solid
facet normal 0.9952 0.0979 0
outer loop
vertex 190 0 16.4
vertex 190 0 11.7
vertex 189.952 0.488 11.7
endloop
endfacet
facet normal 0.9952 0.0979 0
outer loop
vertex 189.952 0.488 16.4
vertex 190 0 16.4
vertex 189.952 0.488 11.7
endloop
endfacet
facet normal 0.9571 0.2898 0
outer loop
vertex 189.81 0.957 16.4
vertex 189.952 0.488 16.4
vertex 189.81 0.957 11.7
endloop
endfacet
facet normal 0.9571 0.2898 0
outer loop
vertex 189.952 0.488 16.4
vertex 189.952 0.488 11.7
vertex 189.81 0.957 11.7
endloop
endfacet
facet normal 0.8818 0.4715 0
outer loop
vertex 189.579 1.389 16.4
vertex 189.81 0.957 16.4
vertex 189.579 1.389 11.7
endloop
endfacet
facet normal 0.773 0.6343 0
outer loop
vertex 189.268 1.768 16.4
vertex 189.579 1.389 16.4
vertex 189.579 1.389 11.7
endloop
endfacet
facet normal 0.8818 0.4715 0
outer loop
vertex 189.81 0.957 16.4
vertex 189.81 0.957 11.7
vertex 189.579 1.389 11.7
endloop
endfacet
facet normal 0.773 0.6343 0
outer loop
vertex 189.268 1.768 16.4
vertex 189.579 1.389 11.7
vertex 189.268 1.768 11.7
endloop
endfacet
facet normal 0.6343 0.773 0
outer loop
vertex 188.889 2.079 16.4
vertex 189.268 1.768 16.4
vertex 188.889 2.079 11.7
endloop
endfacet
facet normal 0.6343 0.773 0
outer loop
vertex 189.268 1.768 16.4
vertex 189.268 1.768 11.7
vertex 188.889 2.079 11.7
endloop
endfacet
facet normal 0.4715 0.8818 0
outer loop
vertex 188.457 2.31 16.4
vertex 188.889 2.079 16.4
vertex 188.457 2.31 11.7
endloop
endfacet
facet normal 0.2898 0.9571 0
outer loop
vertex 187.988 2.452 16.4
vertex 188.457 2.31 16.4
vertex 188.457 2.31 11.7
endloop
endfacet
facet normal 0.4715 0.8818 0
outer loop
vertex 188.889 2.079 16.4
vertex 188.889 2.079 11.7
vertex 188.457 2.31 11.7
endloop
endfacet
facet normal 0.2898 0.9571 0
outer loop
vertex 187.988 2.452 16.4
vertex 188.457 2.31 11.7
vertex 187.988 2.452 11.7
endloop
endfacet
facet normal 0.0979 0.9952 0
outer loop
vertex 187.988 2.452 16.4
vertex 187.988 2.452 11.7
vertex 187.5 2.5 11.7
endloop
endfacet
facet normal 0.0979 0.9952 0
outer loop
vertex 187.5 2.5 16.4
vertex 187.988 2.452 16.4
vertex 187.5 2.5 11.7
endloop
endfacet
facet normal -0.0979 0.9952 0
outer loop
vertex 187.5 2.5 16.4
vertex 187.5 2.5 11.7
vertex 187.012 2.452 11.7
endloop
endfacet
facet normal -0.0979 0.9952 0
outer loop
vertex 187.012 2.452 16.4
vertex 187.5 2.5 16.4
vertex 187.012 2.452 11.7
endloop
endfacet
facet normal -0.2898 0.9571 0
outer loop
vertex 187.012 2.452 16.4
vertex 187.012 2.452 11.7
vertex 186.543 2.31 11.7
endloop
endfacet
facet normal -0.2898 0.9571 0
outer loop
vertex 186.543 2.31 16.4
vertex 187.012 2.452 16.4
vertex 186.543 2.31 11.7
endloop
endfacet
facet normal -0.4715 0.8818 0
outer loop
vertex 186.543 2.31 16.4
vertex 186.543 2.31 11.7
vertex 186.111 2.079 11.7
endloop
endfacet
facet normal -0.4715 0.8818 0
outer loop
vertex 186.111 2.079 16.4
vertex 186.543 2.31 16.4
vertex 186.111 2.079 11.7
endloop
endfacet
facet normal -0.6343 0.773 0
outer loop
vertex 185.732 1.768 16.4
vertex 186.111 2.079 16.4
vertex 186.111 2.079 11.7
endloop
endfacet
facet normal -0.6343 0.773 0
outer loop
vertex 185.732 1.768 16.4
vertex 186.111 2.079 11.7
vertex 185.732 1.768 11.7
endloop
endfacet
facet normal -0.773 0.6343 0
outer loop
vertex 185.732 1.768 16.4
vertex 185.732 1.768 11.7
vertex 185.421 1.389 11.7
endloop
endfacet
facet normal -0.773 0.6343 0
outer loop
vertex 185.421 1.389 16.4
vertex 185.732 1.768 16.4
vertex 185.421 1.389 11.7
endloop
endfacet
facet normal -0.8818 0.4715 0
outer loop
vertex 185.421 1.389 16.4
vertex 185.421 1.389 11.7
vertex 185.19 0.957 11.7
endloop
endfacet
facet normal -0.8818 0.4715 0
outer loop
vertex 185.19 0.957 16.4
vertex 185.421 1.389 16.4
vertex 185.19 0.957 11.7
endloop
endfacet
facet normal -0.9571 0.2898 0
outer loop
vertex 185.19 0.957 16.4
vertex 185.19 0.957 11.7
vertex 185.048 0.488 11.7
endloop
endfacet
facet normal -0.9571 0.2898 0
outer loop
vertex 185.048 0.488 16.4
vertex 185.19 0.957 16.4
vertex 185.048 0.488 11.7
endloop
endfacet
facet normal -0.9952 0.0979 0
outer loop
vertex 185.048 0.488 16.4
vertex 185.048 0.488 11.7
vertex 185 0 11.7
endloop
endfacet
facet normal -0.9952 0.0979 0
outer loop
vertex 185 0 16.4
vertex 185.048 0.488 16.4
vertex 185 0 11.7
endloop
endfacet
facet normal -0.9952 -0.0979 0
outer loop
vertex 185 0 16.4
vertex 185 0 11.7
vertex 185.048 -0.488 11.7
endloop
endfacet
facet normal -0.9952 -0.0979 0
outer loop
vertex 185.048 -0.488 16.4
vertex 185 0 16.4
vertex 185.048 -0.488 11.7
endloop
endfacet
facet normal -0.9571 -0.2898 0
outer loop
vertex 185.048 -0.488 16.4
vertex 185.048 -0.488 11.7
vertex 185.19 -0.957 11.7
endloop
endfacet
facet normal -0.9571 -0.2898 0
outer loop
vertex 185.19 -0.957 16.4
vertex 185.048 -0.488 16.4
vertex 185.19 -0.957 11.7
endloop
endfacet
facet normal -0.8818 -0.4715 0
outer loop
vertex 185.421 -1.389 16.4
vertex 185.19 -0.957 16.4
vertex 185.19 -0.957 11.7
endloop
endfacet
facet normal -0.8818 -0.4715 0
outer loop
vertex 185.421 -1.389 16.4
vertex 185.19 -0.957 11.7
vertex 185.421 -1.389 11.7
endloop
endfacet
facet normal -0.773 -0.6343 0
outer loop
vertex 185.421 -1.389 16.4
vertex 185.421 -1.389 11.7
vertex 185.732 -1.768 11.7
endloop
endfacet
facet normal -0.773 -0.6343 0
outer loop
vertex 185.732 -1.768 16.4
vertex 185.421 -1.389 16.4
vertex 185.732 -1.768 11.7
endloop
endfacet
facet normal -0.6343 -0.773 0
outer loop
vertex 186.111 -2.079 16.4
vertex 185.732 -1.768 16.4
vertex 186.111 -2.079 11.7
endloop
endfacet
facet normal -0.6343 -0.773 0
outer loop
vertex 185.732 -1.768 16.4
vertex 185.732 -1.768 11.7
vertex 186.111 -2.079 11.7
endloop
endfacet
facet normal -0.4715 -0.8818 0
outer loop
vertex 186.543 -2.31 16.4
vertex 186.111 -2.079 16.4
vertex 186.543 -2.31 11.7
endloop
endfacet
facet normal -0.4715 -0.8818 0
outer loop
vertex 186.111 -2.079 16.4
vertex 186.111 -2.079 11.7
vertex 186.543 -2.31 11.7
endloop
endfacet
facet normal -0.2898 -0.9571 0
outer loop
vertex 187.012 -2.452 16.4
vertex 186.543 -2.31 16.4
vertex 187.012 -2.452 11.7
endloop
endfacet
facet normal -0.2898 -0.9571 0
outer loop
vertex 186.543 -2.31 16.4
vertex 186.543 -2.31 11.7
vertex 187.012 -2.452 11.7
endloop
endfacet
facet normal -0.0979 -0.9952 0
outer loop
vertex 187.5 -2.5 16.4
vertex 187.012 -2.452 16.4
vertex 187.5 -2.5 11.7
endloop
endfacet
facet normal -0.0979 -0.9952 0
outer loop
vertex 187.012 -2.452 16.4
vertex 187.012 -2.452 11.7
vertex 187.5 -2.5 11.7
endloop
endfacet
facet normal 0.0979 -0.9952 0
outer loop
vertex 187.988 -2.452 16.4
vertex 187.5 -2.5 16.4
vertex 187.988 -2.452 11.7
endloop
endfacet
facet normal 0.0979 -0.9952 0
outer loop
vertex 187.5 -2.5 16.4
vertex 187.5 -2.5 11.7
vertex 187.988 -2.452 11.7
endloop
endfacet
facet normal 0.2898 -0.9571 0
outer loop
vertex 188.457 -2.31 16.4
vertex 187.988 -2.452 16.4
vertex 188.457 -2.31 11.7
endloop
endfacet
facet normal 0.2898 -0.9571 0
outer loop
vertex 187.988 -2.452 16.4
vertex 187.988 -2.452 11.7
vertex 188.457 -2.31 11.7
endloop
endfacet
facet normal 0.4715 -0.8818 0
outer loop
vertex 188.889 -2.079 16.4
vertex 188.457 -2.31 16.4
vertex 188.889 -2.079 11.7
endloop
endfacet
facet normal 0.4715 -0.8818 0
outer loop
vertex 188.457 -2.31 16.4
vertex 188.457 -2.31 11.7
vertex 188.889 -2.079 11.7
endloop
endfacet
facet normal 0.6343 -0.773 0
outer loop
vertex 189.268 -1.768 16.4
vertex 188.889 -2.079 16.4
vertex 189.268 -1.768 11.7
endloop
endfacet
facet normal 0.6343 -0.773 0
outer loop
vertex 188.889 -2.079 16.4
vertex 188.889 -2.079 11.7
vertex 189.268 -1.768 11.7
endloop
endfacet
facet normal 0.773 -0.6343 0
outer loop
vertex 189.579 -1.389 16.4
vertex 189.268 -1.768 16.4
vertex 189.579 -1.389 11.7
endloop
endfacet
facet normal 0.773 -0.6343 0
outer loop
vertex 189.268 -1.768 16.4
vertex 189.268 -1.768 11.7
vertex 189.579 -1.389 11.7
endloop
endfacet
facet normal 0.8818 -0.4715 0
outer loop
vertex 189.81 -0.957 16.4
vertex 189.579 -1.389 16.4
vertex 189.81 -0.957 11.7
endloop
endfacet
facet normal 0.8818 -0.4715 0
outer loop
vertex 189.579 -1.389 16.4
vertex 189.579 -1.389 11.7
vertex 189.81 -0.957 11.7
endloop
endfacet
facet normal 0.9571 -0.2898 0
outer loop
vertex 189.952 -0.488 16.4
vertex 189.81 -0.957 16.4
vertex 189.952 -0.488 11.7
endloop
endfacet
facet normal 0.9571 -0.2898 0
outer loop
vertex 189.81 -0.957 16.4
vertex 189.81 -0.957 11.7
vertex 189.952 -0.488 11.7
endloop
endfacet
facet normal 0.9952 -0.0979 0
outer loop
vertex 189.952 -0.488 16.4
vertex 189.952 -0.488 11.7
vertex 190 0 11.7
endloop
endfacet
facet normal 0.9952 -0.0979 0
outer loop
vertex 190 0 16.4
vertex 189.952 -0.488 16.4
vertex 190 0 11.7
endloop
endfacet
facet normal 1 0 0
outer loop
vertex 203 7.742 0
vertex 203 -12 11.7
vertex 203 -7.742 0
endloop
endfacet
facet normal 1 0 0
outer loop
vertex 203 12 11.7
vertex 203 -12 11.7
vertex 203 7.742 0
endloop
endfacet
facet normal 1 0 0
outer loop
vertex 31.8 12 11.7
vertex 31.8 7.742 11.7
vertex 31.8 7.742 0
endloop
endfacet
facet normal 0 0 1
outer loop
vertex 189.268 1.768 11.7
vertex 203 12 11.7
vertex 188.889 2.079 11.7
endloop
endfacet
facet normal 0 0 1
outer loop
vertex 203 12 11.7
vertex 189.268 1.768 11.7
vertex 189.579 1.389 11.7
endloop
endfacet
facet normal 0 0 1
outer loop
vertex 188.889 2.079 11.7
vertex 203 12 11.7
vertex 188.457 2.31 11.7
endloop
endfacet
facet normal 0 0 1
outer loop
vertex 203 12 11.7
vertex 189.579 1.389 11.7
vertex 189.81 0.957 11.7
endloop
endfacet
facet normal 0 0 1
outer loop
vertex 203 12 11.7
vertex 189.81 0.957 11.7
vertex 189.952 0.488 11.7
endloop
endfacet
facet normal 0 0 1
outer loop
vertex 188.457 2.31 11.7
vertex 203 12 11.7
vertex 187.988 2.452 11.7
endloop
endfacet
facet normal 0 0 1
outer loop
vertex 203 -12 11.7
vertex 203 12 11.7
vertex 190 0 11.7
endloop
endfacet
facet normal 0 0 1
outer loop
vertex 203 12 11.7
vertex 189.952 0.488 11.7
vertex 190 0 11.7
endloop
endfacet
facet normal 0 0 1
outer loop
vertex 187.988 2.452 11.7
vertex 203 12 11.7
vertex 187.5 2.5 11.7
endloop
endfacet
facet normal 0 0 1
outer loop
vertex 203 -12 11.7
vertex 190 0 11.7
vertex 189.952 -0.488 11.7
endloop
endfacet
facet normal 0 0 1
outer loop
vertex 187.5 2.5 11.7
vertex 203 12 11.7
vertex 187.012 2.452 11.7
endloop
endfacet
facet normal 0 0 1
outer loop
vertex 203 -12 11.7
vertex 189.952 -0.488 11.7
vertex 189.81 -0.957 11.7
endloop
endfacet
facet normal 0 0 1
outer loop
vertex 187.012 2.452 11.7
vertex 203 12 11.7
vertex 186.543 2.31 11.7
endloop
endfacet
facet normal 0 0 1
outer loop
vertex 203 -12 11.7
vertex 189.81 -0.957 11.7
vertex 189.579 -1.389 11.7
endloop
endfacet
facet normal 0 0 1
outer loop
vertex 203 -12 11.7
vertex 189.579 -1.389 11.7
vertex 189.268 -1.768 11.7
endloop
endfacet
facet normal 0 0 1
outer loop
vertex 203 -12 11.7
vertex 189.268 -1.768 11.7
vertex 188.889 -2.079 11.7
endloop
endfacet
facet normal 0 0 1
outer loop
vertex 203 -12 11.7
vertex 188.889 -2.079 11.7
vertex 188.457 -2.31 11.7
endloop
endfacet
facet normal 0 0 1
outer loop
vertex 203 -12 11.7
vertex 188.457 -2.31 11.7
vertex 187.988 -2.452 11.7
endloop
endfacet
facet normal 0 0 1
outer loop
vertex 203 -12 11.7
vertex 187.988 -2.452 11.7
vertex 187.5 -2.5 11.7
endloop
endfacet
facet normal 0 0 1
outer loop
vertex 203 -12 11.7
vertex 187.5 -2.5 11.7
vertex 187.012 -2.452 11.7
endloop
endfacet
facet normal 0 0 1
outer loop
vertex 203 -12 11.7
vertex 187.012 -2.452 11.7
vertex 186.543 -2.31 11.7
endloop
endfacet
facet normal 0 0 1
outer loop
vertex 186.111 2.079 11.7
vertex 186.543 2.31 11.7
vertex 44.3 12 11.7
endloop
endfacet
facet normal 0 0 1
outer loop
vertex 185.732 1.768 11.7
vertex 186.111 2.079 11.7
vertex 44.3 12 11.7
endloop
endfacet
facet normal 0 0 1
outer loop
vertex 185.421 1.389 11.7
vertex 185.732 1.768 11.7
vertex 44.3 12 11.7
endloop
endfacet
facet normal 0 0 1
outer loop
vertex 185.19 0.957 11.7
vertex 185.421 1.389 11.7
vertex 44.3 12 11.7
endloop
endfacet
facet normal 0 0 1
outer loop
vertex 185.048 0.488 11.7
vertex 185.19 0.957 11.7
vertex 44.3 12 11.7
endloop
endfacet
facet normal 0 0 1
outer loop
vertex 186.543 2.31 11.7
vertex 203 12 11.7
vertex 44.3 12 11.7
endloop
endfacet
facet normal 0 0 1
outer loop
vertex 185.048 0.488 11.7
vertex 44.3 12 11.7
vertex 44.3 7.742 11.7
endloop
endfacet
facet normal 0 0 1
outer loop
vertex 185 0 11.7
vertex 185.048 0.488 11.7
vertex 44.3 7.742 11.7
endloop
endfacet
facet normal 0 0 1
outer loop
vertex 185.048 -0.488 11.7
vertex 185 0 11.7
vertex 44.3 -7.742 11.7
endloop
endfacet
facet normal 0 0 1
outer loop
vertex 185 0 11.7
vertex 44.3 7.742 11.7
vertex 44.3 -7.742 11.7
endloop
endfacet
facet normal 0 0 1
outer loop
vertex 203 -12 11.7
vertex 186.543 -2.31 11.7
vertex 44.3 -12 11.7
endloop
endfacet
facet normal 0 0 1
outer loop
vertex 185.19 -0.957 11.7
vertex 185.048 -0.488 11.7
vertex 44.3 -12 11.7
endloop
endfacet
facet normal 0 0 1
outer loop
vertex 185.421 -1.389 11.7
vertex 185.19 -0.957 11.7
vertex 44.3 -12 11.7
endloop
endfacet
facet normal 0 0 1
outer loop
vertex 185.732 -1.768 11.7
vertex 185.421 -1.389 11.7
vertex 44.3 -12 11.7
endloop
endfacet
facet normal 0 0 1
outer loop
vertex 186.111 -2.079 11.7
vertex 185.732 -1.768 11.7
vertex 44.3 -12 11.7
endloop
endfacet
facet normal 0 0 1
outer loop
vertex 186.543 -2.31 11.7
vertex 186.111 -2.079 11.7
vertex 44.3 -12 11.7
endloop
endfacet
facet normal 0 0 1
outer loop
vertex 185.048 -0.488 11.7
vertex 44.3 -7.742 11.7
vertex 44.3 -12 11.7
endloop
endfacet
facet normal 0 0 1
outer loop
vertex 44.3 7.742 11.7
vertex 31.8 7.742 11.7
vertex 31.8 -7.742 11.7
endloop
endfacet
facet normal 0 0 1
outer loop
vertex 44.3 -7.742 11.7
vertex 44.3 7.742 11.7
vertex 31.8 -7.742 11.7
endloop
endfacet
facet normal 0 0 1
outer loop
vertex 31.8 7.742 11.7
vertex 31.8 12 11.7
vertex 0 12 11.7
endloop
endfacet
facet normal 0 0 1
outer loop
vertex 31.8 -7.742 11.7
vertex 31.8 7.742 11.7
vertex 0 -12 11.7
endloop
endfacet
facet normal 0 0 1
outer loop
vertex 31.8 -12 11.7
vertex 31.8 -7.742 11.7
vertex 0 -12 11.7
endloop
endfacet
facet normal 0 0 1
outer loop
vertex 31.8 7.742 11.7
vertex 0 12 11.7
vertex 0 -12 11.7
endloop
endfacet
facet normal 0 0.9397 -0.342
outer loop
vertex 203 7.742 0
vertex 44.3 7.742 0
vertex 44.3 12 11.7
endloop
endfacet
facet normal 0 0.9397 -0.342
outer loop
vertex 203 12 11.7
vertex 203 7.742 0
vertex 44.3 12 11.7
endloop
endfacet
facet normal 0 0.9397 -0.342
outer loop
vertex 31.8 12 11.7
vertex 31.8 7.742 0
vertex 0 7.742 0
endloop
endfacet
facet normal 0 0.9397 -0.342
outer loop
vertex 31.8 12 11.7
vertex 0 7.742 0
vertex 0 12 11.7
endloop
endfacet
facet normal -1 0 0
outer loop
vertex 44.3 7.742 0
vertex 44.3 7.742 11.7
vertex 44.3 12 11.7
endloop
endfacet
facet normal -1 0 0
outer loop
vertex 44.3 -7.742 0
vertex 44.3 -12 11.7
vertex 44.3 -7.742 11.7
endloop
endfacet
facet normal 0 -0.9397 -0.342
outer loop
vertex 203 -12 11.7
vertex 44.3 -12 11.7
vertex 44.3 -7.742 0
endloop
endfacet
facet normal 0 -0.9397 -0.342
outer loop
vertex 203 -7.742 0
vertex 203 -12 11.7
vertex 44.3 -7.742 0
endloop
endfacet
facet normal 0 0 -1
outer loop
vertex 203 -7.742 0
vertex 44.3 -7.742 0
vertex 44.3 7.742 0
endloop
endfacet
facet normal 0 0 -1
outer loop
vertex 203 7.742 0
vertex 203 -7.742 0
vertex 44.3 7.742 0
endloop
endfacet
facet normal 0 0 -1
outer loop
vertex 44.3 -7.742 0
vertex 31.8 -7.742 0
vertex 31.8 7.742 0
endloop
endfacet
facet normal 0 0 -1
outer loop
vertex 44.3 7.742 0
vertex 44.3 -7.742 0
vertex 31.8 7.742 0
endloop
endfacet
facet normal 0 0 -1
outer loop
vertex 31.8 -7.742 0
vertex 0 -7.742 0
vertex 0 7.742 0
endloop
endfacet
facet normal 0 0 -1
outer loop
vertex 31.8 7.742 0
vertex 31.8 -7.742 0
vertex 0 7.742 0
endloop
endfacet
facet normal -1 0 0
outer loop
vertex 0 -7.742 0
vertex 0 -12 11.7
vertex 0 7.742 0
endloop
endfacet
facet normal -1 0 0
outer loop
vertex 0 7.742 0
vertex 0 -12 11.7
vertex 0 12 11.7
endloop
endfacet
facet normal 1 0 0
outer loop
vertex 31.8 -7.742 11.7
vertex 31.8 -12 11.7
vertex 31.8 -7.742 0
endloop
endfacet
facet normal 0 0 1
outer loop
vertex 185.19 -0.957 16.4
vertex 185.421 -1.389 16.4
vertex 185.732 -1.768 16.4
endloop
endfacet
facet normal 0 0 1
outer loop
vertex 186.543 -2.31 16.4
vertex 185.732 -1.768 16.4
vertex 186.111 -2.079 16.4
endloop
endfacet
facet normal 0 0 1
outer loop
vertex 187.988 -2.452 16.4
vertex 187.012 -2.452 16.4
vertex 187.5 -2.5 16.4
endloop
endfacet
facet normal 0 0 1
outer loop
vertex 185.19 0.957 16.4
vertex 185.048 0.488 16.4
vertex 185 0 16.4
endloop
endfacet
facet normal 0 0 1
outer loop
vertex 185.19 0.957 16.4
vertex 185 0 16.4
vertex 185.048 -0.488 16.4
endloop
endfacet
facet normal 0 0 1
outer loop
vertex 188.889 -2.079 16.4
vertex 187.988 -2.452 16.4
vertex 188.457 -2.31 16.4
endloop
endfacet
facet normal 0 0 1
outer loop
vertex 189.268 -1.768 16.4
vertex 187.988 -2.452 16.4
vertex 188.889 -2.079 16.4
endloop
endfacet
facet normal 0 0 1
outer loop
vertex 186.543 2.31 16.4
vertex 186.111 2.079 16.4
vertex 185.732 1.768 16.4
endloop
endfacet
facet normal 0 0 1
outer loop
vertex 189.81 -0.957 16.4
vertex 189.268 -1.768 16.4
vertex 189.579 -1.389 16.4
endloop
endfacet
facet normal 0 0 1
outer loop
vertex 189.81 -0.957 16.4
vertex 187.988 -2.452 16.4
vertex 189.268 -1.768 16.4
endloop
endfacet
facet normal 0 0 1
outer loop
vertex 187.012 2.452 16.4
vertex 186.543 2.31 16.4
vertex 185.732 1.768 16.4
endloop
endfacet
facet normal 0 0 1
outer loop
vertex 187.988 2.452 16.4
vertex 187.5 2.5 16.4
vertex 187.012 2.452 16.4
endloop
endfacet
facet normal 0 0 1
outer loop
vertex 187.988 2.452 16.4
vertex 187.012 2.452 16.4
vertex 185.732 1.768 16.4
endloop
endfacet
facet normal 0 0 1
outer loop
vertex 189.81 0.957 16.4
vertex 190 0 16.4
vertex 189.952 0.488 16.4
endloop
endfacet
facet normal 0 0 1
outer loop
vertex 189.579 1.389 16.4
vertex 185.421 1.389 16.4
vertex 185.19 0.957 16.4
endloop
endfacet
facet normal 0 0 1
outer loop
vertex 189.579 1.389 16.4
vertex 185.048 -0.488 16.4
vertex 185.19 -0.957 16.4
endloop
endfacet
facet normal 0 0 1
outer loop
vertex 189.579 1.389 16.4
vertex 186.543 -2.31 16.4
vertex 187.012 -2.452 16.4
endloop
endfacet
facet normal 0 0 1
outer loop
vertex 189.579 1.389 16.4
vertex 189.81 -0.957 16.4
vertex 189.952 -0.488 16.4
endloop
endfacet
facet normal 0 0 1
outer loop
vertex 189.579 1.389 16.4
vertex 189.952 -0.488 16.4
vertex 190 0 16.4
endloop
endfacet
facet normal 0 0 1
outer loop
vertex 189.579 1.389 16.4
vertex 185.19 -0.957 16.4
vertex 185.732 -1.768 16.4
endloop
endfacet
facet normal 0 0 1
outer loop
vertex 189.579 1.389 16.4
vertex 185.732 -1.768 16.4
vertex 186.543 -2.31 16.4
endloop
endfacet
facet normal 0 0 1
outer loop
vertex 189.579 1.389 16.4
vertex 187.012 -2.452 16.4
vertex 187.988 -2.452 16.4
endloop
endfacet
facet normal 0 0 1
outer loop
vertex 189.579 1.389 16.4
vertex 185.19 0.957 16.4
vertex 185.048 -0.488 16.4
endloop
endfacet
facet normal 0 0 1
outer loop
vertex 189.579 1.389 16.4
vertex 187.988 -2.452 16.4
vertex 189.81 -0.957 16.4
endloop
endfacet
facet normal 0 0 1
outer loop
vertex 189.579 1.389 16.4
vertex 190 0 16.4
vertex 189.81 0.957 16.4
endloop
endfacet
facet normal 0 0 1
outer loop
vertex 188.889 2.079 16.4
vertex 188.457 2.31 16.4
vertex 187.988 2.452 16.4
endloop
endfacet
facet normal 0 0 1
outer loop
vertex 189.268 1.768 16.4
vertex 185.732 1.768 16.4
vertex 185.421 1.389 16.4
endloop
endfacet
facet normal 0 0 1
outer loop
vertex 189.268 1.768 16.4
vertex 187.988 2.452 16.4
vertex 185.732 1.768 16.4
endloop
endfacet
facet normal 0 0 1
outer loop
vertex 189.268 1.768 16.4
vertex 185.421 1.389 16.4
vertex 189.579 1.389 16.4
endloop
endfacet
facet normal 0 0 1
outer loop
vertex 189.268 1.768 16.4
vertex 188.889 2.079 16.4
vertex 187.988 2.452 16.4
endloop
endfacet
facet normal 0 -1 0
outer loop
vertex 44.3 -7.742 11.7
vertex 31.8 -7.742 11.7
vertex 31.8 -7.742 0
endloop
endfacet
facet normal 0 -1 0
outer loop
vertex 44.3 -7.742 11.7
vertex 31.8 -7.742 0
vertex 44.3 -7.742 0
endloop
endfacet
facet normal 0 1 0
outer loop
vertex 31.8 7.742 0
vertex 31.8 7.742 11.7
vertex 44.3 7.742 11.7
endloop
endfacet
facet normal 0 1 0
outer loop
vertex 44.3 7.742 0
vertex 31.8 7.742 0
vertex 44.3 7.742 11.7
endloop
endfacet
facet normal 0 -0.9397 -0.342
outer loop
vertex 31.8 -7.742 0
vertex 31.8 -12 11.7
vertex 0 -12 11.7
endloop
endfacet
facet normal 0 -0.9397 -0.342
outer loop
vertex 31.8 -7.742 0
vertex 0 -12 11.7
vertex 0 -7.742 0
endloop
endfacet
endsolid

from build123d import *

# Parameters (mm, degrees)
F1_DEPTH  = 203
F2_R      = 2.5
F3_DEPTH  = 10
F4_W      = 12.5
F4_H      = 4.258452
F5_DEPTH  = 11.701
F3_FACE_R = 2.5
F6_DEPTH  = 14.7


with BuildPart() as f1:
    # F0 (on Right) → F1 (new body)
    with BuildSketch(Plane.YZ):
        Polygon((-12, 11.7), (-7.741548, 0), (0, 0), (0, 11.7), align=None)
        Polygon((0, 11.7), (0, 0), (7.741548, 0), (12, 11.7), align=None)
    extrude(amount=F1_DEPTH)

    # F2 (on face) → F3 (cut)
    with BuildSketch(Plane.XY.offset(11.7)):
        with Locations((187.5, 0)):
            Circle(F2_R)
    extrude(amount=-F3_DEPTH, mode=Mode.SUBTRACT)

    # F4 (on face) → F5 (cut, through all)
    with BuildSketch(Plane.XY.offset(11.7)):
        with Locations((38.05, 9.870774)):
            Rectangle(F4_W, F4_H)
        with Locations((38.05, -9.870774)):
            Rectangle(F4_W, F4_H)
    extrude(amount=-F5_DEPTH, mode=Mode.SUBTRACT)

    # F3_face (on face) → F6 (join)
    with BuildSketch(Plane(origin=(187.5, 0, 1.7), x_dir=(1, 0, 0), z_dir=(0, 0, 1))):
        Circle(F3_FACE_R)
    extrude(amount=F6_DEPTH)


solid = f1.part
